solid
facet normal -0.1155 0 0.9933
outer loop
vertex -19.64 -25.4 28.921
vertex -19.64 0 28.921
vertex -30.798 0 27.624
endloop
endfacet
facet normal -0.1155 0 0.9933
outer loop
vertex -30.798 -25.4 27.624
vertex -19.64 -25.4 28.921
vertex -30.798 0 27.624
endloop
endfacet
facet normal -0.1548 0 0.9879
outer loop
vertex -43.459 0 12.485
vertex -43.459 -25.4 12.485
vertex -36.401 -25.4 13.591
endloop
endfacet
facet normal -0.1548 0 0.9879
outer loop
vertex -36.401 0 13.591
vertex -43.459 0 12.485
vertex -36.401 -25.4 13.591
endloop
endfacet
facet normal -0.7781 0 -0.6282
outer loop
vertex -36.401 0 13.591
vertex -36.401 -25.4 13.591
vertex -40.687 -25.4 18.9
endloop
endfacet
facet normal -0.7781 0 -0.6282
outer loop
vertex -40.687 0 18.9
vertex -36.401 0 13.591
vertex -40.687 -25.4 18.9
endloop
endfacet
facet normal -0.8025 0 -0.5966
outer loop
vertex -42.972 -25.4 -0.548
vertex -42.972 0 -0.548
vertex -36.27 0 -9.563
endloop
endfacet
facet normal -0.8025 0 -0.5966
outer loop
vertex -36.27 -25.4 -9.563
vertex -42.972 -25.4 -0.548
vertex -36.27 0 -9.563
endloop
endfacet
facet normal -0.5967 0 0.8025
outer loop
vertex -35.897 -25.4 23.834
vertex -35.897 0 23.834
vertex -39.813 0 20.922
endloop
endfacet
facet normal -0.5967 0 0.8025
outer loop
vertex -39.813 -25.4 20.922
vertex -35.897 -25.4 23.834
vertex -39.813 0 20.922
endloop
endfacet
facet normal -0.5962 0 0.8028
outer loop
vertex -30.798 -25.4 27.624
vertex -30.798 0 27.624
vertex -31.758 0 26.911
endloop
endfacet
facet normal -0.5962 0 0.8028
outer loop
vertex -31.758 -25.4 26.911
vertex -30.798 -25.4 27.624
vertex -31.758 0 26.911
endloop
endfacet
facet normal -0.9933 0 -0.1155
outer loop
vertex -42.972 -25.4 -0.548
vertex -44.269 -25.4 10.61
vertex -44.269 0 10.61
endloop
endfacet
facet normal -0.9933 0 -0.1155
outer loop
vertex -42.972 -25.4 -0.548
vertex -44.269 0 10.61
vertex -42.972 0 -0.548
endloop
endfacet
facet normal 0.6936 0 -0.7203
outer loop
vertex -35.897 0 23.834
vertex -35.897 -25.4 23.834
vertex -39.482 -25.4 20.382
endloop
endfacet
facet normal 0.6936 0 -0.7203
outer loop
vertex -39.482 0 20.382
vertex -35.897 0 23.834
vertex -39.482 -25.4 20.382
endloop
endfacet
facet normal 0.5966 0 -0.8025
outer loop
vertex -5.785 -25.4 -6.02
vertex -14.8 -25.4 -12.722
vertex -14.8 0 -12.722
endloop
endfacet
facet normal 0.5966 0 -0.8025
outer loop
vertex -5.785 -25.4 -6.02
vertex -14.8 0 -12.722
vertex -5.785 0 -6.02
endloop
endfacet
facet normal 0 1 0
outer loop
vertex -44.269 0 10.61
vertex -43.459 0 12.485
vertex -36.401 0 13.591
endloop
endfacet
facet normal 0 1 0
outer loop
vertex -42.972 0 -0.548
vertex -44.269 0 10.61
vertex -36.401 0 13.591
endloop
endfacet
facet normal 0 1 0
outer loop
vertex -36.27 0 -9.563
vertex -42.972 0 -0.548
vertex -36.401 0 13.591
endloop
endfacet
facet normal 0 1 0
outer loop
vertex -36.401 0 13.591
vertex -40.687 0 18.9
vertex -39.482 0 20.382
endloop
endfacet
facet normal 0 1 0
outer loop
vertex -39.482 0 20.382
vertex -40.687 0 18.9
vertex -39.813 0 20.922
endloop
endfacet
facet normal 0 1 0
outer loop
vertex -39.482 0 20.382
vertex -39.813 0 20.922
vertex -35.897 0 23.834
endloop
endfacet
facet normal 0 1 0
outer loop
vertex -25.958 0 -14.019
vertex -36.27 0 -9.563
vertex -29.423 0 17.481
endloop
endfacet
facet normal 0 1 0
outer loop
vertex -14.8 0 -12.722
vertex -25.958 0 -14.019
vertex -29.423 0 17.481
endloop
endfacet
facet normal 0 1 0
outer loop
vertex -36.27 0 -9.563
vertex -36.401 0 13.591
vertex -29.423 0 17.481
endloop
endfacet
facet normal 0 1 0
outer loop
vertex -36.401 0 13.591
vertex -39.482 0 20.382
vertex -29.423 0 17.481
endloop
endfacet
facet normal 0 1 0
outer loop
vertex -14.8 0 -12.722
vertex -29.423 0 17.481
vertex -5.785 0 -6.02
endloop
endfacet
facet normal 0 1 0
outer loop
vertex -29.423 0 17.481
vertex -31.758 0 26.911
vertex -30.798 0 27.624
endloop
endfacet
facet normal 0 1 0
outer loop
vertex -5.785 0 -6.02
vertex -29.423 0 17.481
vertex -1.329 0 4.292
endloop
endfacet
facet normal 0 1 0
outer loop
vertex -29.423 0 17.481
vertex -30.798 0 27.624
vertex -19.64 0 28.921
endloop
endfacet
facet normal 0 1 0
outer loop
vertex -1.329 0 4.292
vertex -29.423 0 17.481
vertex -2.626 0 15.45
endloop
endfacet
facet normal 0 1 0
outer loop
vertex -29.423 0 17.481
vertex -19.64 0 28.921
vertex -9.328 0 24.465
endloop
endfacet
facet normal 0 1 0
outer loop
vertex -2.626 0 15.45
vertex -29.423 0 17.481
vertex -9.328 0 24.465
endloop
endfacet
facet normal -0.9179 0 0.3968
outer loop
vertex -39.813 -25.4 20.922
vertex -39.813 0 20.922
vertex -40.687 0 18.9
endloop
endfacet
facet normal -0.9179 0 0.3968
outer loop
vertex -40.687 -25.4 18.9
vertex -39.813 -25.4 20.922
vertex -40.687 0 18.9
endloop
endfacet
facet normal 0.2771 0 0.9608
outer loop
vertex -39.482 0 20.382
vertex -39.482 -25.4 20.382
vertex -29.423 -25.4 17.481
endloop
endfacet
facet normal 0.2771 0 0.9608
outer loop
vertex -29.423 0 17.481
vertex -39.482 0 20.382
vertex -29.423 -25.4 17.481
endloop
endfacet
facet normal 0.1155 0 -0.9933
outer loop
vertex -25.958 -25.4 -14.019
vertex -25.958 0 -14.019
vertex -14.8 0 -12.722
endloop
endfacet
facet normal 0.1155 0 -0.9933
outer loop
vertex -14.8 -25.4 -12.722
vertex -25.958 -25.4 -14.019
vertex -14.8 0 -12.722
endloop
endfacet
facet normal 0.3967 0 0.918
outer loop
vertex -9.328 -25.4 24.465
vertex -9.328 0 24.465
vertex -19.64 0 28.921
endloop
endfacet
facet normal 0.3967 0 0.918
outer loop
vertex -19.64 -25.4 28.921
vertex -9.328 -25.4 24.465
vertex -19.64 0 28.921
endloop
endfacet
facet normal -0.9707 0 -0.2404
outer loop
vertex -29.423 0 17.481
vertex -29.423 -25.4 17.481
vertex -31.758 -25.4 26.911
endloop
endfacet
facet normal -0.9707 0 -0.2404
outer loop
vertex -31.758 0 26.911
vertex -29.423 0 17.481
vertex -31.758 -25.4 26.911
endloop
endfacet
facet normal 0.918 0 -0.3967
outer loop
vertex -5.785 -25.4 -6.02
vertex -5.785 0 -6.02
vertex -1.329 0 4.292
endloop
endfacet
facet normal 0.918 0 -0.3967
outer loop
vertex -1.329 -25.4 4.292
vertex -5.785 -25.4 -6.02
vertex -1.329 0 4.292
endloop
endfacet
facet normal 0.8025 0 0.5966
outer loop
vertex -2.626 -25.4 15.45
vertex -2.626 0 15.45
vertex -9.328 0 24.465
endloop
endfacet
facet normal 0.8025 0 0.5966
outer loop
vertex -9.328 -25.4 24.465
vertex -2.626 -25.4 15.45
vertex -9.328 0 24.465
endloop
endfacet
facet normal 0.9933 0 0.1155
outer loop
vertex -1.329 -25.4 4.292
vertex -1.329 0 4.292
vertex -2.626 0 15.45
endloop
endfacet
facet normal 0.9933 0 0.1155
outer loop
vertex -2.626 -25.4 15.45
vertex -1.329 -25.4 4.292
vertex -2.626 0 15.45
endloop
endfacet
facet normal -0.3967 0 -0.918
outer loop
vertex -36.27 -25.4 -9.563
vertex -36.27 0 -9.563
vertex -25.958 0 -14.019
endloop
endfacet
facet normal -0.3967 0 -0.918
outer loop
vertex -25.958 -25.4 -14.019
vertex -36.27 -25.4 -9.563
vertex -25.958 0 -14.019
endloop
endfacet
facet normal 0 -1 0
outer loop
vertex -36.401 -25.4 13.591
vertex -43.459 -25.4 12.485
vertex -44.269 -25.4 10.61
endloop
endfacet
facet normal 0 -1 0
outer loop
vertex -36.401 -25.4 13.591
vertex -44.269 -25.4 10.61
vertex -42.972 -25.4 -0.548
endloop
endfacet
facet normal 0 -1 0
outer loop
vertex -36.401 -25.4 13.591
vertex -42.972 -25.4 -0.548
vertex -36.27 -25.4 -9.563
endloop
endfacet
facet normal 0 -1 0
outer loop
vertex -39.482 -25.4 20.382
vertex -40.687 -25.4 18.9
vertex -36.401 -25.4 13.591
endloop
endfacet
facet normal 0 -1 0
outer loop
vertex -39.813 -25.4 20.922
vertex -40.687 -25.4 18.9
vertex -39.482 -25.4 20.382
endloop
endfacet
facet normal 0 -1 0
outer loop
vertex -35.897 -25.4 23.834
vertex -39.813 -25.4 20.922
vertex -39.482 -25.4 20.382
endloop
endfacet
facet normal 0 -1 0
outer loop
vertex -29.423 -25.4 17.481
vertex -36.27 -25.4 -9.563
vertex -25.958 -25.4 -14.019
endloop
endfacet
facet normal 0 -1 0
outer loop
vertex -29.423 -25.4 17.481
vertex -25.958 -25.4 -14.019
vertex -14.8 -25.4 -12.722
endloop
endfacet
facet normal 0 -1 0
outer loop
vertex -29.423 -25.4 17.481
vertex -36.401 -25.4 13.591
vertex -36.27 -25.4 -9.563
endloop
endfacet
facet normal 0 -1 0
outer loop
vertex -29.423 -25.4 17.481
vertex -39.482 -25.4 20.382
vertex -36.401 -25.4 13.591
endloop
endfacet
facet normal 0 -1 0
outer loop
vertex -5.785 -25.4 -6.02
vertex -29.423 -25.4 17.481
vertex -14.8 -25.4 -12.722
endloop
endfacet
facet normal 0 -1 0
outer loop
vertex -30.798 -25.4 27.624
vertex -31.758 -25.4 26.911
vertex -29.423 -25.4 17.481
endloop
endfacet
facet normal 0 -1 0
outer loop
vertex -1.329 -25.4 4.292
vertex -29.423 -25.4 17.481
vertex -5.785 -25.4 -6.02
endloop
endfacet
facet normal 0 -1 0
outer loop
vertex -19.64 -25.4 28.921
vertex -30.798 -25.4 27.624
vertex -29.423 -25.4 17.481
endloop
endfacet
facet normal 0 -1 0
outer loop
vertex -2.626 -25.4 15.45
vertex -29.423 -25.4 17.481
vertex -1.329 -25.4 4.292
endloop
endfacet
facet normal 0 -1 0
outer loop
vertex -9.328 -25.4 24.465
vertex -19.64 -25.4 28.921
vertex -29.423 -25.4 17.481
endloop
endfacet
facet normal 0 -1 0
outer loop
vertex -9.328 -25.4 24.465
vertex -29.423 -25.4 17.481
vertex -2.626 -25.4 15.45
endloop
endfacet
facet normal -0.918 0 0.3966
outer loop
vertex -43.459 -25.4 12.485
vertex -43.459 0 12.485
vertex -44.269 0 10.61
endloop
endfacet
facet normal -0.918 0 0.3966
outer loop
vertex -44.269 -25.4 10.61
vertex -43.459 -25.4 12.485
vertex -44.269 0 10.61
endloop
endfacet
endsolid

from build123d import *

# Parameters (mm, degrees)
F1_DEPTH = 25.4
F3_DEPTH = 25.4
F5_DEPTH = 25.4


with BuildPart() as f1:
    # F0 (on Front) → F1 (new body)
    with BuildSketch(Plane.XZ):
        Polygon((-2.625628, 15.450482), (-9.327945, 24.465393), (-19.639778, 28.921377), (-30.798078, 27.624455), (-39.81299, 20.922138), (-44.268973, 10.610306), (-42.972052, -0.547995), (-36.269735, -9.562907), (-25.957902, -14.01889), (-14.799602, -12.721969), (-5.78469, -6.019652), (-1.328707, 4.292181), align=None)
    extrude(amount=F1_DEPTH)

    # F2 (on face) → F3 (cut)
    with BuildSketch(Plane.XZ.offset(25.4)):
        Polygon((-42.977218, 21.73793), (-46.744515, 11.969563), (-36.401212, 13.591172), align=None)
    extrude(amount=-F3_DEPTH, mode=Mode.SUBTRACT)

    # F4 (on face) → F5 (cut)
    with BuildSketch(Plane.XZ.offset(25.4)):
        Polygon((-31.939655, 27.643172), (-39.482275, 20.382153), (-29.422739, 17.480562), align=None)
    extrude(amount=-F5_DEPTH, mode=Mode.SUBTRACT)


solid = f1.part
